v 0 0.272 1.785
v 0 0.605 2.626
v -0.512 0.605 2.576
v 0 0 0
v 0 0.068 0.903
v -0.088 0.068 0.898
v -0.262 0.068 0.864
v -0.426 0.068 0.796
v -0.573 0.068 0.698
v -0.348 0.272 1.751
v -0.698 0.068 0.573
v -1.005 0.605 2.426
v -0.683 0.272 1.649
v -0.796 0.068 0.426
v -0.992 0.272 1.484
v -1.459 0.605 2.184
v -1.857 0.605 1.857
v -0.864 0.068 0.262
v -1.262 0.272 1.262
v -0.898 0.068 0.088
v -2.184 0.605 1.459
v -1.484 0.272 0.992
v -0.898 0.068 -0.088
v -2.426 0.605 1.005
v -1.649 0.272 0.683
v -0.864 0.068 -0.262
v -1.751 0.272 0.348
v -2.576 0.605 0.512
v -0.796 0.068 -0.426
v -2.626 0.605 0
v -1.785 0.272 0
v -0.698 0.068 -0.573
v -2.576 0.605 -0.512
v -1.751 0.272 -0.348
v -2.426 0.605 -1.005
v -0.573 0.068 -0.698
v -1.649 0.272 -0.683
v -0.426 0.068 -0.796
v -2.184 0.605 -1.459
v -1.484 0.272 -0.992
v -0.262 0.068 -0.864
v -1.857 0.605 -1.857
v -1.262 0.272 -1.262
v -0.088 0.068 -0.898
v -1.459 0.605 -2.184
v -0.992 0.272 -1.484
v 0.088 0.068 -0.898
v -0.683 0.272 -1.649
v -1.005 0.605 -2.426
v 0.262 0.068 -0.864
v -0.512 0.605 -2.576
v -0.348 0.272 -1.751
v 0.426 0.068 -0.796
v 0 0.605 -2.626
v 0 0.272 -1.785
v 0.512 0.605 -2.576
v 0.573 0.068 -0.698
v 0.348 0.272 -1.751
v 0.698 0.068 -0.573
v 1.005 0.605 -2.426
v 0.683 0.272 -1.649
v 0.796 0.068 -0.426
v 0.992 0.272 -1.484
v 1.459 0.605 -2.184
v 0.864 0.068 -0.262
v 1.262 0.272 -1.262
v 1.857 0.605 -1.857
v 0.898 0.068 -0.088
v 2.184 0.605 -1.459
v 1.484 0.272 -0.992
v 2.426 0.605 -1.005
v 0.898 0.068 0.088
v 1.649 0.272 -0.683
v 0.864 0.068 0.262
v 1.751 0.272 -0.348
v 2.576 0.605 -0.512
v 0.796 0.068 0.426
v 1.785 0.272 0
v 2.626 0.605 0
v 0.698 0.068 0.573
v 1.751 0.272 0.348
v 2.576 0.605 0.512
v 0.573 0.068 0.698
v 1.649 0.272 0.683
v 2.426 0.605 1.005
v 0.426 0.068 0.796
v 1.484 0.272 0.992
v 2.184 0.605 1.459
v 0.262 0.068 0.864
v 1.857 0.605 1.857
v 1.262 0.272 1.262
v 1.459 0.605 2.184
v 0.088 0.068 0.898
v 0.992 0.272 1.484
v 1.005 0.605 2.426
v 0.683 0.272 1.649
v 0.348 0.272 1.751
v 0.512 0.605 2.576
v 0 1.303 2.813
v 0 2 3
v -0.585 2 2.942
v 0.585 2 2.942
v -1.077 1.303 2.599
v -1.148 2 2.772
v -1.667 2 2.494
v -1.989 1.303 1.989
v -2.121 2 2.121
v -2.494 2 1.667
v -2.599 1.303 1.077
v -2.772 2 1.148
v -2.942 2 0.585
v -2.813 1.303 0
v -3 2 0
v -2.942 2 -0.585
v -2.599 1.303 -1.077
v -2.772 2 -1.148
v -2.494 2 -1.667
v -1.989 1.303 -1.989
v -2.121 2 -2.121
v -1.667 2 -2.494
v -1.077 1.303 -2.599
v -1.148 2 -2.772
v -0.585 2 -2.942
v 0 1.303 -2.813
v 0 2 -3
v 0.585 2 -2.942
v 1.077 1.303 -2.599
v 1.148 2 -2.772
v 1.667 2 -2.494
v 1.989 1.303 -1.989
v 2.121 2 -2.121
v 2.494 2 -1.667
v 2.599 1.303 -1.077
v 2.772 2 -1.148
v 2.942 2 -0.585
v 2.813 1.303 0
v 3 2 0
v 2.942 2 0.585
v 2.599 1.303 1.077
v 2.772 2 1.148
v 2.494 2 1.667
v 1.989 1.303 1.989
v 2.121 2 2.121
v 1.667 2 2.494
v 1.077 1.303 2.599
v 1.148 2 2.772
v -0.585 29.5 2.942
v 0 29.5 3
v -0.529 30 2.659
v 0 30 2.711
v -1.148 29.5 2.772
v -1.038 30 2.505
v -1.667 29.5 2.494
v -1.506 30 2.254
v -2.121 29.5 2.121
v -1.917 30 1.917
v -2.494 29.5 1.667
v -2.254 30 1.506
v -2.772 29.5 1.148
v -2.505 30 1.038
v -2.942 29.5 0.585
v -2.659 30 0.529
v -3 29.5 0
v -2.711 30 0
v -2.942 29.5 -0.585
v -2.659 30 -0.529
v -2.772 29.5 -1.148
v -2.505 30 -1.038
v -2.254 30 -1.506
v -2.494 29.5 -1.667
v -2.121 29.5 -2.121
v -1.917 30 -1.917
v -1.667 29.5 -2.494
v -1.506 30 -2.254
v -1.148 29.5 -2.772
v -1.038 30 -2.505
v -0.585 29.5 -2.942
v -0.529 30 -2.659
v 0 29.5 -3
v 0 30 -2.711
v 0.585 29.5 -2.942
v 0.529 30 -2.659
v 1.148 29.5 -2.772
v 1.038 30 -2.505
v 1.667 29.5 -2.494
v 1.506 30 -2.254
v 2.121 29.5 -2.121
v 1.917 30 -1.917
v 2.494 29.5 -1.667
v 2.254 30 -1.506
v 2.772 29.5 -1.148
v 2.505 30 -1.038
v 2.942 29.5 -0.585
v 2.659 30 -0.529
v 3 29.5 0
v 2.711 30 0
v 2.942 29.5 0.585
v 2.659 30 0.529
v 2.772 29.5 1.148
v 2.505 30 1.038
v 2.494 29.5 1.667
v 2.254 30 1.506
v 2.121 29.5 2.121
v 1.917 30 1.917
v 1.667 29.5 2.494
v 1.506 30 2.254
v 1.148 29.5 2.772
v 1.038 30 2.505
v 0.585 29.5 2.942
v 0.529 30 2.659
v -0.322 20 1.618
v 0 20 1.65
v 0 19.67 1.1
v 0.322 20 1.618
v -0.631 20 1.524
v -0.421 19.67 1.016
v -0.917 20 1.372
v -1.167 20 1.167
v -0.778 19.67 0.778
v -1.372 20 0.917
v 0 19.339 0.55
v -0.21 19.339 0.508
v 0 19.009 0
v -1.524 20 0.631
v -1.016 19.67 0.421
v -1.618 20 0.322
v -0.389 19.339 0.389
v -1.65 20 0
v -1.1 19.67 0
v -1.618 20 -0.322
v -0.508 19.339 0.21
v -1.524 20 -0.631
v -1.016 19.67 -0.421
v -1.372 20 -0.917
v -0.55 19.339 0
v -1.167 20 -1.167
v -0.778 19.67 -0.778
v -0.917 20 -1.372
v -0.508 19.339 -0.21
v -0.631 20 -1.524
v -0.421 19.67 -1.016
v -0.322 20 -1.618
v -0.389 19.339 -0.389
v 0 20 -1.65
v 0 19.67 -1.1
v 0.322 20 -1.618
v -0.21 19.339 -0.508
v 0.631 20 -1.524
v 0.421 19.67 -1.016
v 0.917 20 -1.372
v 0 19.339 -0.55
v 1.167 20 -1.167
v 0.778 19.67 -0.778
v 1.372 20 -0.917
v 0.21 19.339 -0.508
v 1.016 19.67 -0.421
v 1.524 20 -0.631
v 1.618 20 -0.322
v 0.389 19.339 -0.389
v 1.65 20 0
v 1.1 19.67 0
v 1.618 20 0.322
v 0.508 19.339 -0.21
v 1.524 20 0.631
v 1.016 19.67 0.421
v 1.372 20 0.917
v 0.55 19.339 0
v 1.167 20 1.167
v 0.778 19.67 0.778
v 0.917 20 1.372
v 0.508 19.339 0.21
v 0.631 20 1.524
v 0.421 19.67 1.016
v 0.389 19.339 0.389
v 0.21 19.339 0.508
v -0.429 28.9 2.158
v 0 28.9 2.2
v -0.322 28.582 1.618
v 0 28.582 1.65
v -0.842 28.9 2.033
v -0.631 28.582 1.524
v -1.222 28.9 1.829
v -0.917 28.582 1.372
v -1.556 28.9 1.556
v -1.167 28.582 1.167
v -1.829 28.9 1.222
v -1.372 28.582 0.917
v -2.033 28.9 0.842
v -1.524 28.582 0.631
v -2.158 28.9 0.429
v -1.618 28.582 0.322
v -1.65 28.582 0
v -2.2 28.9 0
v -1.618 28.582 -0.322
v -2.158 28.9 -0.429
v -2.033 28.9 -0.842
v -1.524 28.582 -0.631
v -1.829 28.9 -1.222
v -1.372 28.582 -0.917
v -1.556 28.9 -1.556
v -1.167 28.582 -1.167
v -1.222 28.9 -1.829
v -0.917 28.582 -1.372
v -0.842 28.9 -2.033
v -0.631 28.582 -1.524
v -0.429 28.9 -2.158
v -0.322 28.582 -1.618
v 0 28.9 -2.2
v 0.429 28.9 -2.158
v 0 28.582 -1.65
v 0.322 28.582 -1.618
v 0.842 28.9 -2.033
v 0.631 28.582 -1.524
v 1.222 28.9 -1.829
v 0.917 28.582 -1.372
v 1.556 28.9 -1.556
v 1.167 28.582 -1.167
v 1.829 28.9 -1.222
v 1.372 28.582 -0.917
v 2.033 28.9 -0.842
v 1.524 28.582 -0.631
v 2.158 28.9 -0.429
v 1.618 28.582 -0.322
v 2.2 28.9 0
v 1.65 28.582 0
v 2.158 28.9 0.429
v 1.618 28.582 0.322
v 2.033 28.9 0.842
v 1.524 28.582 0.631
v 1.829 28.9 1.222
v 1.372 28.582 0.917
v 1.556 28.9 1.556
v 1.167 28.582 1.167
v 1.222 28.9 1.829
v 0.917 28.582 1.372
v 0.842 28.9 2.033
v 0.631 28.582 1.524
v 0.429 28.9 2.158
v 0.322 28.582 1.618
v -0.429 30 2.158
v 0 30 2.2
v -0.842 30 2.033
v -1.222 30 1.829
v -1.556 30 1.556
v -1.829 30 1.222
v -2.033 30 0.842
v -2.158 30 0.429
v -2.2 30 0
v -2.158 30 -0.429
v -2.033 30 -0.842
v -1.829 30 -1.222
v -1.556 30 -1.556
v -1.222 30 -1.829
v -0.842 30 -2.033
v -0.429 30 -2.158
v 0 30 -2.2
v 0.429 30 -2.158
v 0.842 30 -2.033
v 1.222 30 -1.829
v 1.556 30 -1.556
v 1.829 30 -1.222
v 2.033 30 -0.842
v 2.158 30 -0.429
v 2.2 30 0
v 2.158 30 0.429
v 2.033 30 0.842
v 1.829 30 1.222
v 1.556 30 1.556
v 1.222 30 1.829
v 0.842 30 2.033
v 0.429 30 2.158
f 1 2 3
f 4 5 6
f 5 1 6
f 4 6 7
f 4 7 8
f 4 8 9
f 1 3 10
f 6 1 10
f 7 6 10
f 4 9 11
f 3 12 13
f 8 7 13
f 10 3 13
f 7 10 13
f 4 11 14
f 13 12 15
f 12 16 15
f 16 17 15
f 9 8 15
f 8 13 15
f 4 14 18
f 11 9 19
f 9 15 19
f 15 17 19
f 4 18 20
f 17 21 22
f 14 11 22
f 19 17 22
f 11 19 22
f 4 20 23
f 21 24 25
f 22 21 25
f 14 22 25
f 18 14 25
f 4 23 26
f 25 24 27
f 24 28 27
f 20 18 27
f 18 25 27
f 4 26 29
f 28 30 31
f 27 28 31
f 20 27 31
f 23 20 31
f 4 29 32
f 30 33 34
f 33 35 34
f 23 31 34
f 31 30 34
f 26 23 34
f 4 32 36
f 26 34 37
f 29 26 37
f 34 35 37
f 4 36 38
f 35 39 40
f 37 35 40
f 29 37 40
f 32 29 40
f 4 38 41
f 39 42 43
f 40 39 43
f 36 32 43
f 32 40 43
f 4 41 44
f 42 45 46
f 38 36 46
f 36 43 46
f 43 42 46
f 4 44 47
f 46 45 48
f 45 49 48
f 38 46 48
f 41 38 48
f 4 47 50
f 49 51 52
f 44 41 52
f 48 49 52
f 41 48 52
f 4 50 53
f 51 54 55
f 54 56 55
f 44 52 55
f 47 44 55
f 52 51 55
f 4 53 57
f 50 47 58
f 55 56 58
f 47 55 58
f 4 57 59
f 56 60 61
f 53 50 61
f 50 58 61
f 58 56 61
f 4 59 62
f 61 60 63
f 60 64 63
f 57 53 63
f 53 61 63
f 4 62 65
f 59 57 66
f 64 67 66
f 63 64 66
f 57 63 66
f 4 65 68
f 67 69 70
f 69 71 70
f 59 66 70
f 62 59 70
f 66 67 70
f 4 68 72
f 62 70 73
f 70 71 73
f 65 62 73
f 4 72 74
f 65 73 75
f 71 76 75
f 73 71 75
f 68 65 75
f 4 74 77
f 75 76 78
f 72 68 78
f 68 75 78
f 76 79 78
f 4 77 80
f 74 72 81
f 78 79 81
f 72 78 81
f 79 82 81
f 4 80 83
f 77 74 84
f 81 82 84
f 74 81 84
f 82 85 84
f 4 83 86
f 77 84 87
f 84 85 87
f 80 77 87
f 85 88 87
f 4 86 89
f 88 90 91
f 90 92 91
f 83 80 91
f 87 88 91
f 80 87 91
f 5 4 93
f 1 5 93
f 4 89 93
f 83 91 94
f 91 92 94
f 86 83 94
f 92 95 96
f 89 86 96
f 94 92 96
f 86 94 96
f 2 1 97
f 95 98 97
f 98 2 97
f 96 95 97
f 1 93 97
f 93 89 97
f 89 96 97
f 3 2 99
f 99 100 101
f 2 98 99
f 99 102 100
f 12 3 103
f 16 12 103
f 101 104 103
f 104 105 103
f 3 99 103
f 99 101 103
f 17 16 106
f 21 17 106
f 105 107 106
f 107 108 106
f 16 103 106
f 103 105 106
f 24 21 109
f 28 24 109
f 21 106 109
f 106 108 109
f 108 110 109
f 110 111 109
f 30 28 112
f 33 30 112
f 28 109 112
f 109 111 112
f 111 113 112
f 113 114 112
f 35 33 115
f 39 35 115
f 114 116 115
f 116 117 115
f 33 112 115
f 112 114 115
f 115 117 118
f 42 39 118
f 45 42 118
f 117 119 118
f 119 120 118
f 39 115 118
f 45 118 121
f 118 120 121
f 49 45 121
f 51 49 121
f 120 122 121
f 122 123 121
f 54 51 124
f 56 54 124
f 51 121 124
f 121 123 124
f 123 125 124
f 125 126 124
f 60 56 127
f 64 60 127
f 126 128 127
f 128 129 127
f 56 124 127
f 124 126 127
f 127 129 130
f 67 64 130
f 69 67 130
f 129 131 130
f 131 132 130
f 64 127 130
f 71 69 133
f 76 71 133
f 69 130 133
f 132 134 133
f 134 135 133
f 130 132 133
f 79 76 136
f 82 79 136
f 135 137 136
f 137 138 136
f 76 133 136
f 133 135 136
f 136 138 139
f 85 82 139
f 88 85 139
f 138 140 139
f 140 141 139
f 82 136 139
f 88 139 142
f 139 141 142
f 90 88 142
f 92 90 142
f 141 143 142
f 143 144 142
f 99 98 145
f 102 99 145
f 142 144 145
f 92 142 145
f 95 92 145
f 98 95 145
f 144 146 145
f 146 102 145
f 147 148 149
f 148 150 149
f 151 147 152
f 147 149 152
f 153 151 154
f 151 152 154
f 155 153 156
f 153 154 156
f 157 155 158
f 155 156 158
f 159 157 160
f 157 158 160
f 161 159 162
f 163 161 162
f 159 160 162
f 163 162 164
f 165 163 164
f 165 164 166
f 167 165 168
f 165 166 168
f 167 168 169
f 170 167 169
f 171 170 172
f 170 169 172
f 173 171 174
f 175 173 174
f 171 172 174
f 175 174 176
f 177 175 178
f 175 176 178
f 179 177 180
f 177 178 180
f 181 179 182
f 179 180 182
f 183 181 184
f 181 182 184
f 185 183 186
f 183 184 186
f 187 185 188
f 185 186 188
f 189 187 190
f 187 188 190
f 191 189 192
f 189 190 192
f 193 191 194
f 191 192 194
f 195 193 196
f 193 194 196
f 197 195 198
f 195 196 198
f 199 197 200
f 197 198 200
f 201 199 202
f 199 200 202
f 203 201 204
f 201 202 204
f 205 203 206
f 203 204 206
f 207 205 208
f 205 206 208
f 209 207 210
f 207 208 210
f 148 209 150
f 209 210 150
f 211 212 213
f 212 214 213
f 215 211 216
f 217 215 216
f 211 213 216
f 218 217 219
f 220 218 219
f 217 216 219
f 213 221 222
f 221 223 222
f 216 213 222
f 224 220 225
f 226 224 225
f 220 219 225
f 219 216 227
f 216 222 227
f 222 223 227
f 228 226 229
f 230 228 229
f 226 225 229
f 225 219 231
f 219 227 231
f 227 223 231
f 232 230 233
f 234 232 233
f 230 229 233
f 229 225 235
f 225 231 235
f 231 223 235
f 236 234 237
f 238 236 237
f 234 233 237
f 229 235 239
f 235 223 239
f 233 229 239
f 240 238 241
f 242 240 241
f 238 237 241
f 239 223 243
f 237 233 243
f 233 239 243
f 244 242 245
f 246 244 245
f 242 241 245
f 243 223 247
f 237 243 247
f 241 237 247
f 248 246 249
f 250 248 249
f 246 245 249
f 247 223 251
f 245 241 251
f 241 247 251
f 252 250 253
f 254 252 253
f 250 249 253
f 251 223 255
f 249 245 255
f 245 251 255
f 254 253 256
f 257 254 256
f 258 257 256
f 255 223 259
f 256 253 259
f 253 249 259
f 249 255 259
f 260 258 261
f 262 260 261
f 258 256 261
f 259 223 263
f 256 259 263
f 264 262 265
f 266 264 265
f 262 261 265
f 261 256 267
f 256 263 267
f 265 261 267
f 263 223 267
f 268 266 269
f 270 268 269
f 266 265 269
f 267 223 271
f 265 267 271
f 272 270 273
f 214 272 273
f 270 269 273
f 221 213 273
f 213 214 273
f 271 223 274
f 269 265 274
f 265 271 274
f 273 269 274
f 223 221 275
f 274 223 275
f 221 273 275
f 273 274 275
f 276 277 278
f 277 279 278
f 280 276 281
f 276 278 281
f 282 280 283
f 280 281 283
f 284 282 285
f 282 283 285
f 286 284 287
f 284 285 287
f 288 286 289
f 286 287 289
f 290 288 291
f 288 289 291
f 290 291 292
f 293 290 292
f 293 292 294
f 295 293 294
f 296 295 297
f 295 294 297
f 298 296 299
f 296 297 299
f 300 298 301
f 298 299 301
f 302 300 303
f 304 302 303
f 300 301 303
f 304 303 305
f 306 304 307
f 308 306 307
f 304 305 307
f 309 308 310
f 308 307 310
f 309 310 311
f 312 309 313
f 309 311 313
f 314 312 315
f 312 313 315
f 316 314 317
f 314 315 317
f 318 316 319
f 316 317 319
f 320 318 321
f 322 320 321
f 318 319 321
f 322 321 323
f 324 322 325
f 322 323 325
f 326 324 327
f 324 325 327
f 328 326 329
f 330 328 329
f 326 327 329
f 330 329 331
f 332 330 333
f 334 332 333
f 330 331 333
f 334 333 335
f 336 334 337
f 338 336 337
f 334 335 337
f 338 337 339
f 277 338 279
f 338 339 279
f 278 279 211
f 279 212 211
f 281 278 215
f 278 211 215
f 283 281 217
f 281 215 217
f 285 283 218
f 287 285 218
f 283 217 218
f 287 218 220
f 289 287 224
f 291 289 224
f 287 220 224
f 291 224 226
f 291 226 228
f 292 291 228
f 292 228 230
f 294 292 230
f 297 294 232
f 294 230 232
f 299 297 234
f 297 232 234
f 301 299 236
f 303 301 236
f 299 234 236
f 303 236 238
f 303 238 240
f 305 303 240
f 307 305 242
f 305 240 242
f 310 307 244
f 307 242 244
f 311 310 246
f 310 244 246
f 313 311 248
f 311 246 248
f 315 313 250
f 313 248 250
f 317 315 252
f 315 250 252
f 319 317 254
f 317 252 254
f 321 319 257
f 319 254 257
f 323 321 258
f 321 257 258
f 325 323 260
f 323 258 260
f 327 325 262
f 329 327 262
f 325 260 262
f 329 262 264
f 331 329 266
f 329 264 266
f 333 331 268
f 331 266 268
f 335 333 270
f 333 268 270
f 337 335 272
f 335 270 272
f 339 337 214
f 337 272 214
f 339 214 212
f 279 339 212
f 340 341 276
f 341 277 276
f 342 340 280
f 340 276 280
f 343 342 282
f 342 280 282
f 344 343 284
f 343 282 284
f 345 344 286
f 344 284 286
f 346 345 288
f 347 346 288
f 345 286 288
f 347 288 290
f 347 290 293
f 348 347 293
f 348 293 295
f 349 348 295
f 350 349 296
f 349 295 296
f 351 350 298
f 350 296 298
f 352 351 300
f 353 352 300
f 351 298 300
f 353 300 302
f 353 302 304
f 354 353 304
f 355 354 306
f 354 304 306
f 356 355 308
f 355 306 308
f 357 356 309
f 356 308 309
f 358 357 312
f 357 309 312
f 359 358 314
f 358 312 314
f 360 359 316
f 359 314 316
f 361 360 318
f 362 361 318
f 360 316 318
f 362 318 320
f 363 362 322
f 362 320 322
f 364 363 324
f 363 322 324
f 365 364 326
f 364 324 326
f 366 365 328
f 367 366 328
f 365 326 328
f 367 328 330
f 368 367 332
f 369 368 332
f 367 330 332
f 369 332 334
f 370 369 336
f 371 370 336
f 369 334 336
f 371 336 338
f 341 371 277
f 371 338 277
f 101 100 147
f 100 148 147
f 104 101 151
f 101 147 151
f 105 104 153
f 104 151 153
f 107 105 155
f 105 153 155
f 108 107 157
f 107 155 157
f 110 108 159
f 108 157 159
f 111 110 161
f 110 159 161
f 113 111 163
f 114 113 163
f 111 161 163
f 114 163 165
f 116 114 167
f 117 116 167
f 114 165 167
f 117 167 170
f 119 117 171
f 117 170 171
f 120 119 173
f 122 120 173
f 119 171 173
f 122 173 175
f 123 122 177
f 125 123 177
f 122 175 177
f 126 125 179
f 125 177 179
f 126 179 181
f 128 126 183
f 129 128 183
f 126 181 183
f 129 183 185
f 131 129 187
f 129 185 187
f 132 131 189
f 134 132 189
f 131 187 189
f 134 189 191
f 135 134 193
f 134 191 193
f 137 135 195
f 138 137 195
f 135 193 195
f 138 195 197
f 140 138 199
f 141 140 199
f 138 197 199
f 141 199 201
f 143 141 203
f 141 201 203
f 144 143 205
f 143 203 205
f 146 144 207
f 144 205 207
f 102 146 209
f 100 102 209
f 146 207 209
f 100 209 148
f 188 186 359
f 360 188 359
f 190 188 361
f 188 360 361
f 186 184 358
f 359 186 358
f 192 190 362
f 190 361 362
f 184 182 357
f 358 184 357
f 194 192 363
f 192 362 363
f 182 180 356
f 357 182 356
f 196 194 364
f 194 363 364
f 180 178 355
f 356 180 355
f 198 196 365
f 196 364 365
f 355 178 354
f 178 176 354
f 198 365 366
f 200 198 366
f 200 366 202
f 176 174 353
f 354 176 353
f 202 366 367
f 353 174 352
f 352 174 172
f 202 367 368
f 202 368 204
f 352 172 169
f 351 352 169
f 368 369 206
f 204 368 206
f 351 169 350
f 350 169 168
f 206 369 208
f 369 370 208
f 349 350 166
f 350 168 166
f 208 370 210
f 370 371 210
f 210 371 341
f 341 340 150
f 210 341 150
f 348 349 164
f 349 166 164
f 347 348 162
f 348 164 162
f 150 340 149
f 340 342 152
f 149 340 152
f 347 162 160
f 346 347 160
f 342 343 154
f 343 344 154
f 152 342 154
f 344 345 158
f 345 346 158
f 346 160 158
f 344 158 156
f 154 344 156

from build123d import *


with BuildPart() as part:
    # Sketch1 → Revolve1 (revolve)
    with BuildSketch(Plane.XY, mode=Mode.PRIVATE) as revolve1_sk:
        with BuildLine():
            Line((2.711324865, 30), (2.2, 30))
            Line((2.2, 30), (2.2, 28.9))
            Line((2.2, 28.9), (1.65, 28.582457352))
            Line((1.65, 28.582457352), (1.65, 20))
            Line((1.65, 20), (0, 19.008579979))
            Line((0, 19.008579979), (0, 0))
            ThreePointArc((0, 0), (1.347576341, 0.153288274), (2.626296799, 0.605320665))
            Line((2.626296799, 0.605320665), (3, 2))
            Line((3, 2), (3, 29.5))
            Line((3, 29.5), (2.711324865, 30))
        make_face()
    revolve(revolve1_sk.sketch.rotate(Axis((0, 30, 0), (0, -1, 0)), 90), axis=Axis((0, 30, 0), (0, -1, 0)))


solid = part.part
